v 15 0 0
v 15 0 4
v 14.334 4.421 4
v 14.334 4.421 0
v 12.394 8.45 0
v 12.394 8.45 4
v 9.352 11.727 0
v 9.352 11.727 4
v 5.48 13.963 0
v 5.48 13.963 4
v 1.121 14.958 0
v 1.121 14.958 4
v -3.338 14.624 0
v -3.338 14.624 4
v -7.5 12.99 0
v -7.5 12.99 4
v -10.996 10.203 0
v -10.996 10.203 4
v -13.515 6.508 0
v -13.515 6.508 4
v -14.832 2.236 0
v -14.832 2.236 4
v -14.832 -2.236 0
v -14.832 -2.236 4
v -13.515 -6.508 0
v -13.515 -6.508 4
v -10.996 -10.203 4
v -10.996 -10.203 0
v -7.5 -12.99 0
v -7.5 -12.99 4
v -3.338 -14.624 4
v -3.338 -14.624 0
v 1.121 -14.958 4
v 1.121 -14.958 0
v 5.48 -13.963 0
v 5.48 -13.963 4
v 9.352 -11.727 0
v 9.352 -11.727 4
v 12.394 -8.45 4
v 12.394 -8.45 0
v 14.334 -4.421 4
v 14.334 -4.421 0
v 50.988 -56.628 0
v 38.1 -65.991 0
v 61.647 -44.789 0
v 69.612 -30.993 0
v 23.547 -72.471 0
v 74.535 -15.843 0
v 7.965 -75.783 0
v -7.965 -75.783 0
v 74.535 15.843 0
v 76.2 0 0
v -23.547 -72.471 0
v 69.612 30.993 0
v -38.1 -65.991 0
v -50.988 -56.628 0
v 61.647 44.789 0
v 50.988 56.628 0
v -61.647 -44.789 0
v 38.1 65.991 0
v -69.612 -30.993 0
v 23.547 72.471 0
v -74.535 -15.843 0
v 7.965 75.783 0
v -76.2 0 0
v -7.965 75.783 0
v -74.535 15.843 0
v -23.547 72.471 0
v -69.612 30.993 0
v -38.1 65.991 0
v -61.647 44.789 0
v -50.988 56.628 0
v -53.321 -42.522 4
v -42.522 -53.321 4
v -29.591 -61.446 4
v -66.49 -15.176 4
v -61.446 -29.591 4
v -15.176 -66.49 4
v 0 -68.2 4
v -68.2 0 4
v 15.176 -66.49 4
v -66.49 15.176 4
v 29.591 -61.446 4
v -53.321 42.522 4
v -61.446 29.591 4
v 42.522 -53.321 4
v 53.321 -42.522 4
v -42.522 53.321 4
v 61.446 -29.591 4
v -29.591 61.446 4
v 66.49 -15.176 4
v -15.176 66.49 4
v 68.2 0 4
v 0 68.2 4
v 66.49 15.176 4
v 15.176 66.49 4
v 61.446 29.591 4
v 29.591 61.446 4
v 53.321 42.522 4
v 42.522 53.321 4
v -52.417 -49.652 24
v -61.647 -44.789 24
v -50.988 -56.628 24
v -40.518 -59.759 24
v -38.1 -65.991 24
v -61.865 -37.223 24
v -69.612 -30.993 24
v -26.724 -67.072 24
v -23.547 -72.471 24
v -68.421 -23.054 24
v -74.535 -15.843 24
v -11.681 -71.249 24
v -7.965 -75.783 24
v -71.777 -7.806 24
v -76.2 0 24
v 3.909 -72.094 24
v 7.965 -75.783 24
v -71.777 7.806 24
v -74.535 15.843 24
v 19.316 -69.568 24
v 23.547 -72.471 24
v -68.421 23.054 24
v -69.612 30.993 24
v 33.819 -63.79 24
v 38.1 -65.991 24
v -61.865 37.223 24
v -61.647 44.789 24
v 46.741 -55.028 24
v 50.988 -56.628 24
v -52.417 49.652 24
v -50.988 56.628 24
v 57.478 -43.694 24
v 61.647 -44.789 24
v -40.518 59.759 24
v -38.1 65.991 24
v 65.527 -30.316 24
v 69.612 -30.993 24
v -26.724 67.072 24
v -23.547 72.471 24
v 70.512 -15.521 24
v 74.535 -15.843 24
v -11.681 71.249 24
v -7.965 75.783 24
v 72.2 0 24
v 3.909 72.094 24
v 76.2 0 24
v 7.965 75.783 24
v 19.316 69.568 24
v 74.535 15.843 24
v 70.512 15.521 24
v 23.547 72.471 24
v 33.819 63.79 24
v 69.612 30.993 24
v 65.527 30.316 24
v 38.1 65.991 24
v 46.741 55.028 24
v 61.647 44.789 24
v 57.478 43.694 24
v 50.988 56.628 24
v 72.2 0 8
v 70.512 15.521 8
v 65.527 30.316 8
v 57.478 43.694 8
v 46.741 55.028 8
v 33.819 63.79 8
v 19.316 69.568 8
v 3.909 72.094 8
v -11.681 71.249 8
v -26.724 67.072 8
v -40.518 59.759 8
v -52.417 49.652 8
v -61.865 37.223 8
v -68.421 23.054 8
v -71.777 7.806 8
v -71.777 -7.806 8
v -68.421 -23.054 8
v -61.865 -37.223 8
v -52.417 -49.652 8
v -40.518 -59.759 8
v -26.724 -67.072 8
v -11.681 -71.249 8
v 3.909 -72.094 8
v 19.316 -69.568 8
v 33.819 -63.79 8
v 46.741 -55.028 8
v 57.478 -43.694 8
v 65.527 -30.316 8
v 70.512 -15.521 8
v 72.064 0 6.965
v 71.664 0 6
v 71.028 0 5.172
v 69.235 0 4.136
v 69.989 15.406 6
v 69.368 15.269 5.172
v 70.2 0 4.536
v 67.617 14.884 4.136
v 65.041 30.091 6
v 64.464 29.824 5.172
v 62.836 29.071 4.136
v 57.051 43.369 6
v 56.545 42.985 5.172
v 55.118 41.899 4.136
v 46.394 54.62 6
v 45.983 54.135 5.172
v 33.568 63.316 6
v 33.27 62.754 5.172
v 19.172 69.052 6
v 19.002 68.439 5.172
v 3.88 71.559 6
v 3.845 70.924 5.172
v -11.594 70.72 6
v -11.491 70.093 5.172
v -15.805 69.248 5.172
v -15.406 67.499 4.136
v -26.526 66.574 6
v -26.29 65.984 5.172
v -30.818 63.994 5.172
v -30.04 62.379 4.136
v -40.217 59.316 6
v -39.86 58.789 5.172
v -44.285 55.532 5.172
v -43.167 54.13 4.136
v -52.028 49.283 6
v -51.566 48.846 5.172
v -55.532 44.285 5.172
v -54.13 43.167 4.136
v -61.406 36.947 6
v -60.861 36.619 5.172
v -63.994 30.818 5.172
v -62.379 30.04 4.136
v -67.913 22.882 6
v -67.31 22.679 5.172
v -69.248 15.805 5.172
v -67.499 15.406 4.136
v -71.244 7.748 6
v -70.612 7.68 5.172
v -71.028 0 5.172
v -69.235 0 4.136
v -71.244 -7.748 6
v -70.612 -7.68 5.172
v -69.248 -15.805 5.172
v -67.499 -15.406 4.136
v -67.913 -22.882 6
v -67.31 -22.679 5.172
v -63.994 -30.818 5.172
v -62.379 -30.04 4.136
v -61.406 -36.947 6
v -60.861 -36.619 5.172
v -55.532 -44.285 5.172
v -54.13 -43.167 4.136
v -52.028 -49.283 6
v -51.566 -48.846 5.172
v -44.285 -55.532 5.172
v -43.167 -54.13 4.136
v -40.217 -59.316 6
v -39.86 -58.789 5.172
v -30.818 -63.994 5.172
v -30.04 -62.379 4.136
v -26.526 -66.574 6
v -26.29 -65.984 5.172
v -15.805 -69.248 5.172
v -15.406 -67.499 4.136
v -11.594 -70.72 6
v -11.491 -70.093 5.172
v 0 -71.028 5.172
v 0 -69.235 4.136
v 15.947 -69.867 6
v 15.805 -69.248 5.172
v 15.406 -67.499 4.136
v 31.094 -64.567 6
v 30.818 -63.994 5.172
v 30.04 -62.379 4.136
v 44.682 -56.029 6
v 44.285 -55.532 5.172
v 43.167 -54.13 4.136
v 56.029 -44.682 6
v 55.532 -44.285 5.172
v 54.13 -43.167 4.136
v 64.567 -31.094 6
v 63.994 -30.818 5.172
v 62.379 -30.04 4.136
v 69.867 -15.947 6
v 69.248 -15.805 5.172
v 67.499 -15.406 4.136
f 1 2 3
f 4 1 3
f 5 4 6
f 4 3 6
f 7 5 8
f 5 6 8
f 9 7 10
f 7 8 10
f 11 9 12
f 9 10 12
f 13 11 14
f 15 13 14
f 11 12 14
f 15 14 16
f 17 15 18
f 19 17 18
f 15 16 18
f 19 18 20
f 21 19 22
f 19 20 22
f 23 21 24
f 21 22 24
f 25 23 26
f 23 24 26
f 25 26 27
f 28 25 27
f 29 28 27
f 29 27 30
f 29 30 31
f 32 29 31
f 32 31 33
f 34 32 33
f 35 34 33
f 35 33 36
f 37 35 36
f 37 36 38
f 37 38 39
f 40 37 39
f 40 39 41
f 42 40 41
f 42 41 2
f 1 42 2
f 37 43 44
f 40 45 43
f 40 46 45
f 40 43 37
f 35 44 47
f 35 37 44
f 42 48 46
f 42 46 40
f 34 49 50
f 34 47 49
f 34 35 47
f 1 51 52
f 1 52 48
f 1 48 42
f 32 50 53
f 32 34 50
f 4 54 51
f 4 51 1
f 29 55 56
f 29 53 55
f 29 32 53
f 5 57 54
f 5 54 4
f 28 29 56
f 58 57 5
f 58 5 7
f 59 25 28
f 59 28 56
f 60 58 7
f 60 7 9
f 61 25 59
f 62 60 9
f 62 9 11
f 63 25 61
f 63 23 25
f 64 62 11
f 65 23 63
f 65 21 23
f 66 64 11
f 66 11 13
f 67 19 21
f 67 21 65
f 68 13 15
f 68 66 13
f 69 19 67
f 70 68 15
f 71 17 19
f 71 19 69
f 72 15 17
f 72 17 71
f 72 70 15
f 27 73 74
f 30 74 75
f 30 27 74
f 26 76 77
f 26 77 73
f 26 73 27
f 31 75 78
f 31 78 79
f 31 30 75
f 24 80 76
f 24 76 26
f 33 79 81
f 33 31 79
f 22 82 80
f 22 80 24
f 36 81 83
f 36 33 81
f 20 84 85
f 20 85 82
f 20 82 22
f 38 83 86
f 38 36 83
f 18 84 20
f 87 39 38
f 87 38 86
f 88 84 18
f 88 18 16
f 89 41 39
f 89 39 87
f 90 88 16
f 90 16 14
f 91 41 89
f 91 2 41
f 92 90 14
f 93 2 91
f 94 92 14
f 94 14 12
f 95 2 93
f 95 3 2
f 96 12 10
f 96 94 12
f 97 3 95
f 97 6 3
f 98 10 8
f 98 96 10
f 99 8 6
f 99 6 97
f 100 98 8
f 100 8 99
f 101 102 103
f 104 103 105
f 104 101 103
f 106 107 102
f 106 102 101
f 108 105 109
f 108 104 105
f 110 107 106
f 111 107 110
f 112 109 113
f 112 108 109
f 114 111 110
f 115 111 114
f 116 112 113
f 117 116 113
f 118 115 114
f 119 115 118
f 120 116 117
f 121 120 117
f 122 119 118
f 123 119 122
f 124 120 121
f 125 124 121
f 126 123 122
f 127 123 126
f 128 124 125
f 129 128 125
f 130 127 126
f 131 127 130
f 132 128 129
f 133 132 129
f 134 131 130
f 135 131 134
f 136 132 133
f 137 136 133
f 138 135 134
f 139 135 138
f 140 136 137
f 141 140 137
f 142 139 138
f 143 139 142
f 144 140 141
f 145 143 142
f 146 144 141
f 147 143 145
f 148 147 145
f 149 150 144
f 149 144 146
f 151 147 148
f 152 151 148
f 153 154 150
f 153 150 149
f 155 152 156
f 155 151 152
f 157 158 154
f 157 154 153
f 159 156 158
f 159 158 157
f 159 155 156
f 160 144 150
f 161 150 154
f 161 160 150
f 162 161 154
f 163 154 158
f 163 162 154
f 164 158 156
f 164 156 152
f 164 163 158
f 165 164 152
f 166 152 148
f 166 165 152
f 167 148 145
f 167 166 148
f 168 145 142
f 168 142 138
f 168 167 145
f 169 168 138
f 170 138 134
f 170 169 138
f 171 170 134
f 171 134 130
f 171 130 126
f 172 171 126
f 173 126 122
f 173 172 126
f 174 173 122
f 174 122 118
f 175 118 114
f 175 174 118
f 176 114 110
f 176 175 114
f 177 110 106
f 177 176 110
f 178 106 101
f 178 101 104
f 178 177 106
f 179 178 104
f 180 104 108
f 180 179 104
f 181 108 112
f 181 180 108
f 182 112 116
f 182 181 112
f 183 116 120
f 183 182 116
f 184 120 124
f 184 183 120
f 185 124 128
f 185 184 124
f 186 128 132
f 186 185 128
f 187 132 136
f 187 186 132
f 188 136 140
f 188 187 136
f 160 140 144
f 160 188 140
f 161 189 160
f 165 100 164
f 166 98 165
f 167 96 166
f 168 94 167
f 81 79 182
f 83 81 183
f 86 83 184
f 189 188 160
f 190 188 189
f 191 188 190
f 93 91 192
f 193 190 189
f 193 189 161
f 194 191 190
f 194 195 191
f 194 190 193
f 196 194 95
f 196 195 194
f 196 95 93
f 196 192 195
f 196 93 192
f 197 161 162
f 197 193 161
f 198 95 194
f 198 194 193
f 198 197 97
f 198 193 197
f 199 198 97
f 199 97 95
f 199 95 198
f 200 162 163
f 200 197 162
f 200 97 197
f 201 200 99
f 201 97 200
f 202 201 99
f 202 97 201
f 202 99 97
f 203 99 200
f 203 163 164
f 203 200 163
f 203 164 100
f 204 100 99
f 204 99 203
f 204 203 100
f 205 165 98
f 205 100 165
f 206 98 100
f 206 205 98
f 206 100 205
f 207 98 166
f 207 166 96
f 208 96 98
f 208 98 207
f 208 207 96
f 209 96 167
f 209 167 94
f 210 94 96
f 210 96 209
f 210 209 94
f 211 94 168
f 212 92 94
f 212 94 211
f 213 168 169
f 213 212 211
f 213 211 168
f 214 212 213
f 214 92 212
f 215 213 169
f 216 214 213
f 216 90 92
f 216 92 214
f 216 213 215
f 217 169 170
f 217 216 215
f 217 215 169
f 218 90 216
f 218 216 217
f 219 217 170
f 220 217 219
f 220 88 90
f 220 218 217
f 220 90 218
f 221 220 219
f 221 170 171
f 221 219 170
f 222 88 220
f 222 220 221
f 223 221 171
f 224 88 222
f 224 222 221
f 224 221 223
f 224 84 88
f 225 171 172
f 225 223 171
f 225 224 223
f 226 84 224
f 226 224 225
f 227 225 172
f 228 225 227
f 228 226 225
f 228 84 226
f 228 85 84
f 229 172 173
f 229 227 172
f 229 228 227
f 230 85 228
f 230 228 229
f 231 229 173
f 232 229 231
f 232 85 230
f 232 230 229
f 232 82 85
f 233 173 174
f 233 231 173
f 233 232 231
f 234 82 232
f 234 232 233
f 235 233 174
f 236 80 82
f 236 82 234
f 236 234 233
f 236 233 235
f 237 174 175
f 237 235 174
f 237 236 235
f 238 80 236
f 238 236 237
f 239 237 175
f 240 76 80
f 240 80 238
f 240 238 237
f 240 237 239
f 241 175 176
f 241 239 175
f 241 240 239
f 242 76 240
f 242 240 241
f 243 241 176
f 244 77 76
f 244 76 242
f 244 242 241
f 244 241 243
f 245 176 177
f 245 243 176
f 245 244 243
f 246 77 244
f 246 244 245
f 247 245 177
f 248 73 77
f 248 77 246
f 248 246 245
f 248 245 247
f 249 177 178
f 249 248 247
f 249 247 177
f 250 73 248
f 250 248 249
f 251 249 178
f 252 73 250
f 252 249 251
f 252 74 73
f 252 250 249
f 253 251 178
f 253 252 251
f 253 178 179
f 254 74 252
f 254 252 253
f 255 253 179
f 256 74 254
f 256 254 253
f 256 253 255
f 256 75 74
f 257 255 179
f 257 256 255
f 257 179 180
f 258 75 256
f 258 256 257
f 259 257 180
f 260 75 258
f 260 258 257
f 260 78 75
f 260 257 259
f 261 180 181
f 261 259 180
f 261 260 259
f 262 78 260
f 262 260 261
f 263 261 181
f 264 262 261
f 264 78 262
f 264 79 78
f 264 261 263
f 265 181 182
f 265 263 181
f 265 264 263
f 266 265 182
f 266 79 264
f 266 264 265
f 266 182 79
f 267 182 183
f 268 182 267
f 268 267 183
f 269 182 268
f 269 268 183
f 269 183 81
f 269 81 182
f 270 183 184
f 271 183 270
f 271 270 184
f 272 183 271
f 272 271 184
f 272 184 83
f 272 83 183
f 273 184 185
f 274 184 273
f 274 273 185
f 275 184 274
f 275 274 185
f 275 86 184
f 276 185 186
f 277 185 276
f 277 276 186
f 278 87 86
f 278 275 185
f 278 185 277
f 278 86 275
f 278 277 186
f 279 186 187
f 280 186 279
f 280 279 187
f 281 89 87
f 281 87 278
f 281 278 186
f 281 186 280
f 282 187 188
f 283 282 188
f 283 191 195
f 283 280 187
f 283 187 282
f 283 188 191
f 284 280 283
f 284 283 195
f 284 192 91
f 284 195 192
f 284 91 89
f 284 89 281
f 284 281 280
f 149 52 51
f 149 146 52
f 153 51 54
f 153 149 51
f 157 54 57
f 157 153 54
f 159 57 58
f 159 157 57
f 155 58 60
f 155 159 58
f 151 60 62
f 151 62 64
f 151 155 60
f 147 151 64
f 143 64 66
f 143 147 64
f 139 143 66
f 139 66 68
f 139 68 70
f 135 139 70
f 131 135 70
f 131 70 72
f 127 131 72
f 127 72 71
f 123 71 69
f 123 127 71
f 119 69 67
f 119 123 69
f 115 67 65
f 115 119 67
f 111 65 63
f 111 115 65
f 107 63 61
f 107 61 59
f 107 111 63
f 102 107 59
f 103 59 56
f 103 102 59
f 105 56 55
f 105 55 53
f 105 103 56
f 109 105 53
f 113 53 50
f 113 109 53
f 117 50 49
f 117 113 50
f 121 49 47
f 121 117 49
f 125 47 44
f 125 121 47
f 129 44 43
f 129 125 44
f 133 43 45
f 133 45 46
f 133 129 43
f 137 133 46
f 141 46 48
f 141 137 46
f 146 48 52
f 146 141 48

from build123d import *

# Parameters (mm, degrees)
F2_R     = 15
F3_DEPTH = 25


with BuildPart() as f1:
    # F0 (on Front) → F1 (revolve)
    with BuildSketch(Plane.XZ):
        with BuildLine():
            Line((0, 4), (0, 0))
            Line((0, 0), (72.2, 0))
            Line((72.2, 0), (76.2, 0))
            Line((76.2, 0), (76.2, 4))
            Line((76.2, 4), (76.2, 24))
            Line((76.2, 24), (72.2, 24))
            Line((72.2, 24), (72.2, 8))
            ThreePointArc((72.2, 8), (71.028427, 5.171573), (68.2, 4))
            Line((68.2, 4), (0, 4))
        make_face()
    revolve(axis=Axis((0, 0, 2), (0, 0, 1)))

    # F2 (on face) → F3 (cut)
    with BuildSketch(Plane.XY.offset(4)):
        Circle(F2_R)
    extrude(amount=-F3_DEPTH, mode=Mode.SUBTRACT)


solid = f1.part
